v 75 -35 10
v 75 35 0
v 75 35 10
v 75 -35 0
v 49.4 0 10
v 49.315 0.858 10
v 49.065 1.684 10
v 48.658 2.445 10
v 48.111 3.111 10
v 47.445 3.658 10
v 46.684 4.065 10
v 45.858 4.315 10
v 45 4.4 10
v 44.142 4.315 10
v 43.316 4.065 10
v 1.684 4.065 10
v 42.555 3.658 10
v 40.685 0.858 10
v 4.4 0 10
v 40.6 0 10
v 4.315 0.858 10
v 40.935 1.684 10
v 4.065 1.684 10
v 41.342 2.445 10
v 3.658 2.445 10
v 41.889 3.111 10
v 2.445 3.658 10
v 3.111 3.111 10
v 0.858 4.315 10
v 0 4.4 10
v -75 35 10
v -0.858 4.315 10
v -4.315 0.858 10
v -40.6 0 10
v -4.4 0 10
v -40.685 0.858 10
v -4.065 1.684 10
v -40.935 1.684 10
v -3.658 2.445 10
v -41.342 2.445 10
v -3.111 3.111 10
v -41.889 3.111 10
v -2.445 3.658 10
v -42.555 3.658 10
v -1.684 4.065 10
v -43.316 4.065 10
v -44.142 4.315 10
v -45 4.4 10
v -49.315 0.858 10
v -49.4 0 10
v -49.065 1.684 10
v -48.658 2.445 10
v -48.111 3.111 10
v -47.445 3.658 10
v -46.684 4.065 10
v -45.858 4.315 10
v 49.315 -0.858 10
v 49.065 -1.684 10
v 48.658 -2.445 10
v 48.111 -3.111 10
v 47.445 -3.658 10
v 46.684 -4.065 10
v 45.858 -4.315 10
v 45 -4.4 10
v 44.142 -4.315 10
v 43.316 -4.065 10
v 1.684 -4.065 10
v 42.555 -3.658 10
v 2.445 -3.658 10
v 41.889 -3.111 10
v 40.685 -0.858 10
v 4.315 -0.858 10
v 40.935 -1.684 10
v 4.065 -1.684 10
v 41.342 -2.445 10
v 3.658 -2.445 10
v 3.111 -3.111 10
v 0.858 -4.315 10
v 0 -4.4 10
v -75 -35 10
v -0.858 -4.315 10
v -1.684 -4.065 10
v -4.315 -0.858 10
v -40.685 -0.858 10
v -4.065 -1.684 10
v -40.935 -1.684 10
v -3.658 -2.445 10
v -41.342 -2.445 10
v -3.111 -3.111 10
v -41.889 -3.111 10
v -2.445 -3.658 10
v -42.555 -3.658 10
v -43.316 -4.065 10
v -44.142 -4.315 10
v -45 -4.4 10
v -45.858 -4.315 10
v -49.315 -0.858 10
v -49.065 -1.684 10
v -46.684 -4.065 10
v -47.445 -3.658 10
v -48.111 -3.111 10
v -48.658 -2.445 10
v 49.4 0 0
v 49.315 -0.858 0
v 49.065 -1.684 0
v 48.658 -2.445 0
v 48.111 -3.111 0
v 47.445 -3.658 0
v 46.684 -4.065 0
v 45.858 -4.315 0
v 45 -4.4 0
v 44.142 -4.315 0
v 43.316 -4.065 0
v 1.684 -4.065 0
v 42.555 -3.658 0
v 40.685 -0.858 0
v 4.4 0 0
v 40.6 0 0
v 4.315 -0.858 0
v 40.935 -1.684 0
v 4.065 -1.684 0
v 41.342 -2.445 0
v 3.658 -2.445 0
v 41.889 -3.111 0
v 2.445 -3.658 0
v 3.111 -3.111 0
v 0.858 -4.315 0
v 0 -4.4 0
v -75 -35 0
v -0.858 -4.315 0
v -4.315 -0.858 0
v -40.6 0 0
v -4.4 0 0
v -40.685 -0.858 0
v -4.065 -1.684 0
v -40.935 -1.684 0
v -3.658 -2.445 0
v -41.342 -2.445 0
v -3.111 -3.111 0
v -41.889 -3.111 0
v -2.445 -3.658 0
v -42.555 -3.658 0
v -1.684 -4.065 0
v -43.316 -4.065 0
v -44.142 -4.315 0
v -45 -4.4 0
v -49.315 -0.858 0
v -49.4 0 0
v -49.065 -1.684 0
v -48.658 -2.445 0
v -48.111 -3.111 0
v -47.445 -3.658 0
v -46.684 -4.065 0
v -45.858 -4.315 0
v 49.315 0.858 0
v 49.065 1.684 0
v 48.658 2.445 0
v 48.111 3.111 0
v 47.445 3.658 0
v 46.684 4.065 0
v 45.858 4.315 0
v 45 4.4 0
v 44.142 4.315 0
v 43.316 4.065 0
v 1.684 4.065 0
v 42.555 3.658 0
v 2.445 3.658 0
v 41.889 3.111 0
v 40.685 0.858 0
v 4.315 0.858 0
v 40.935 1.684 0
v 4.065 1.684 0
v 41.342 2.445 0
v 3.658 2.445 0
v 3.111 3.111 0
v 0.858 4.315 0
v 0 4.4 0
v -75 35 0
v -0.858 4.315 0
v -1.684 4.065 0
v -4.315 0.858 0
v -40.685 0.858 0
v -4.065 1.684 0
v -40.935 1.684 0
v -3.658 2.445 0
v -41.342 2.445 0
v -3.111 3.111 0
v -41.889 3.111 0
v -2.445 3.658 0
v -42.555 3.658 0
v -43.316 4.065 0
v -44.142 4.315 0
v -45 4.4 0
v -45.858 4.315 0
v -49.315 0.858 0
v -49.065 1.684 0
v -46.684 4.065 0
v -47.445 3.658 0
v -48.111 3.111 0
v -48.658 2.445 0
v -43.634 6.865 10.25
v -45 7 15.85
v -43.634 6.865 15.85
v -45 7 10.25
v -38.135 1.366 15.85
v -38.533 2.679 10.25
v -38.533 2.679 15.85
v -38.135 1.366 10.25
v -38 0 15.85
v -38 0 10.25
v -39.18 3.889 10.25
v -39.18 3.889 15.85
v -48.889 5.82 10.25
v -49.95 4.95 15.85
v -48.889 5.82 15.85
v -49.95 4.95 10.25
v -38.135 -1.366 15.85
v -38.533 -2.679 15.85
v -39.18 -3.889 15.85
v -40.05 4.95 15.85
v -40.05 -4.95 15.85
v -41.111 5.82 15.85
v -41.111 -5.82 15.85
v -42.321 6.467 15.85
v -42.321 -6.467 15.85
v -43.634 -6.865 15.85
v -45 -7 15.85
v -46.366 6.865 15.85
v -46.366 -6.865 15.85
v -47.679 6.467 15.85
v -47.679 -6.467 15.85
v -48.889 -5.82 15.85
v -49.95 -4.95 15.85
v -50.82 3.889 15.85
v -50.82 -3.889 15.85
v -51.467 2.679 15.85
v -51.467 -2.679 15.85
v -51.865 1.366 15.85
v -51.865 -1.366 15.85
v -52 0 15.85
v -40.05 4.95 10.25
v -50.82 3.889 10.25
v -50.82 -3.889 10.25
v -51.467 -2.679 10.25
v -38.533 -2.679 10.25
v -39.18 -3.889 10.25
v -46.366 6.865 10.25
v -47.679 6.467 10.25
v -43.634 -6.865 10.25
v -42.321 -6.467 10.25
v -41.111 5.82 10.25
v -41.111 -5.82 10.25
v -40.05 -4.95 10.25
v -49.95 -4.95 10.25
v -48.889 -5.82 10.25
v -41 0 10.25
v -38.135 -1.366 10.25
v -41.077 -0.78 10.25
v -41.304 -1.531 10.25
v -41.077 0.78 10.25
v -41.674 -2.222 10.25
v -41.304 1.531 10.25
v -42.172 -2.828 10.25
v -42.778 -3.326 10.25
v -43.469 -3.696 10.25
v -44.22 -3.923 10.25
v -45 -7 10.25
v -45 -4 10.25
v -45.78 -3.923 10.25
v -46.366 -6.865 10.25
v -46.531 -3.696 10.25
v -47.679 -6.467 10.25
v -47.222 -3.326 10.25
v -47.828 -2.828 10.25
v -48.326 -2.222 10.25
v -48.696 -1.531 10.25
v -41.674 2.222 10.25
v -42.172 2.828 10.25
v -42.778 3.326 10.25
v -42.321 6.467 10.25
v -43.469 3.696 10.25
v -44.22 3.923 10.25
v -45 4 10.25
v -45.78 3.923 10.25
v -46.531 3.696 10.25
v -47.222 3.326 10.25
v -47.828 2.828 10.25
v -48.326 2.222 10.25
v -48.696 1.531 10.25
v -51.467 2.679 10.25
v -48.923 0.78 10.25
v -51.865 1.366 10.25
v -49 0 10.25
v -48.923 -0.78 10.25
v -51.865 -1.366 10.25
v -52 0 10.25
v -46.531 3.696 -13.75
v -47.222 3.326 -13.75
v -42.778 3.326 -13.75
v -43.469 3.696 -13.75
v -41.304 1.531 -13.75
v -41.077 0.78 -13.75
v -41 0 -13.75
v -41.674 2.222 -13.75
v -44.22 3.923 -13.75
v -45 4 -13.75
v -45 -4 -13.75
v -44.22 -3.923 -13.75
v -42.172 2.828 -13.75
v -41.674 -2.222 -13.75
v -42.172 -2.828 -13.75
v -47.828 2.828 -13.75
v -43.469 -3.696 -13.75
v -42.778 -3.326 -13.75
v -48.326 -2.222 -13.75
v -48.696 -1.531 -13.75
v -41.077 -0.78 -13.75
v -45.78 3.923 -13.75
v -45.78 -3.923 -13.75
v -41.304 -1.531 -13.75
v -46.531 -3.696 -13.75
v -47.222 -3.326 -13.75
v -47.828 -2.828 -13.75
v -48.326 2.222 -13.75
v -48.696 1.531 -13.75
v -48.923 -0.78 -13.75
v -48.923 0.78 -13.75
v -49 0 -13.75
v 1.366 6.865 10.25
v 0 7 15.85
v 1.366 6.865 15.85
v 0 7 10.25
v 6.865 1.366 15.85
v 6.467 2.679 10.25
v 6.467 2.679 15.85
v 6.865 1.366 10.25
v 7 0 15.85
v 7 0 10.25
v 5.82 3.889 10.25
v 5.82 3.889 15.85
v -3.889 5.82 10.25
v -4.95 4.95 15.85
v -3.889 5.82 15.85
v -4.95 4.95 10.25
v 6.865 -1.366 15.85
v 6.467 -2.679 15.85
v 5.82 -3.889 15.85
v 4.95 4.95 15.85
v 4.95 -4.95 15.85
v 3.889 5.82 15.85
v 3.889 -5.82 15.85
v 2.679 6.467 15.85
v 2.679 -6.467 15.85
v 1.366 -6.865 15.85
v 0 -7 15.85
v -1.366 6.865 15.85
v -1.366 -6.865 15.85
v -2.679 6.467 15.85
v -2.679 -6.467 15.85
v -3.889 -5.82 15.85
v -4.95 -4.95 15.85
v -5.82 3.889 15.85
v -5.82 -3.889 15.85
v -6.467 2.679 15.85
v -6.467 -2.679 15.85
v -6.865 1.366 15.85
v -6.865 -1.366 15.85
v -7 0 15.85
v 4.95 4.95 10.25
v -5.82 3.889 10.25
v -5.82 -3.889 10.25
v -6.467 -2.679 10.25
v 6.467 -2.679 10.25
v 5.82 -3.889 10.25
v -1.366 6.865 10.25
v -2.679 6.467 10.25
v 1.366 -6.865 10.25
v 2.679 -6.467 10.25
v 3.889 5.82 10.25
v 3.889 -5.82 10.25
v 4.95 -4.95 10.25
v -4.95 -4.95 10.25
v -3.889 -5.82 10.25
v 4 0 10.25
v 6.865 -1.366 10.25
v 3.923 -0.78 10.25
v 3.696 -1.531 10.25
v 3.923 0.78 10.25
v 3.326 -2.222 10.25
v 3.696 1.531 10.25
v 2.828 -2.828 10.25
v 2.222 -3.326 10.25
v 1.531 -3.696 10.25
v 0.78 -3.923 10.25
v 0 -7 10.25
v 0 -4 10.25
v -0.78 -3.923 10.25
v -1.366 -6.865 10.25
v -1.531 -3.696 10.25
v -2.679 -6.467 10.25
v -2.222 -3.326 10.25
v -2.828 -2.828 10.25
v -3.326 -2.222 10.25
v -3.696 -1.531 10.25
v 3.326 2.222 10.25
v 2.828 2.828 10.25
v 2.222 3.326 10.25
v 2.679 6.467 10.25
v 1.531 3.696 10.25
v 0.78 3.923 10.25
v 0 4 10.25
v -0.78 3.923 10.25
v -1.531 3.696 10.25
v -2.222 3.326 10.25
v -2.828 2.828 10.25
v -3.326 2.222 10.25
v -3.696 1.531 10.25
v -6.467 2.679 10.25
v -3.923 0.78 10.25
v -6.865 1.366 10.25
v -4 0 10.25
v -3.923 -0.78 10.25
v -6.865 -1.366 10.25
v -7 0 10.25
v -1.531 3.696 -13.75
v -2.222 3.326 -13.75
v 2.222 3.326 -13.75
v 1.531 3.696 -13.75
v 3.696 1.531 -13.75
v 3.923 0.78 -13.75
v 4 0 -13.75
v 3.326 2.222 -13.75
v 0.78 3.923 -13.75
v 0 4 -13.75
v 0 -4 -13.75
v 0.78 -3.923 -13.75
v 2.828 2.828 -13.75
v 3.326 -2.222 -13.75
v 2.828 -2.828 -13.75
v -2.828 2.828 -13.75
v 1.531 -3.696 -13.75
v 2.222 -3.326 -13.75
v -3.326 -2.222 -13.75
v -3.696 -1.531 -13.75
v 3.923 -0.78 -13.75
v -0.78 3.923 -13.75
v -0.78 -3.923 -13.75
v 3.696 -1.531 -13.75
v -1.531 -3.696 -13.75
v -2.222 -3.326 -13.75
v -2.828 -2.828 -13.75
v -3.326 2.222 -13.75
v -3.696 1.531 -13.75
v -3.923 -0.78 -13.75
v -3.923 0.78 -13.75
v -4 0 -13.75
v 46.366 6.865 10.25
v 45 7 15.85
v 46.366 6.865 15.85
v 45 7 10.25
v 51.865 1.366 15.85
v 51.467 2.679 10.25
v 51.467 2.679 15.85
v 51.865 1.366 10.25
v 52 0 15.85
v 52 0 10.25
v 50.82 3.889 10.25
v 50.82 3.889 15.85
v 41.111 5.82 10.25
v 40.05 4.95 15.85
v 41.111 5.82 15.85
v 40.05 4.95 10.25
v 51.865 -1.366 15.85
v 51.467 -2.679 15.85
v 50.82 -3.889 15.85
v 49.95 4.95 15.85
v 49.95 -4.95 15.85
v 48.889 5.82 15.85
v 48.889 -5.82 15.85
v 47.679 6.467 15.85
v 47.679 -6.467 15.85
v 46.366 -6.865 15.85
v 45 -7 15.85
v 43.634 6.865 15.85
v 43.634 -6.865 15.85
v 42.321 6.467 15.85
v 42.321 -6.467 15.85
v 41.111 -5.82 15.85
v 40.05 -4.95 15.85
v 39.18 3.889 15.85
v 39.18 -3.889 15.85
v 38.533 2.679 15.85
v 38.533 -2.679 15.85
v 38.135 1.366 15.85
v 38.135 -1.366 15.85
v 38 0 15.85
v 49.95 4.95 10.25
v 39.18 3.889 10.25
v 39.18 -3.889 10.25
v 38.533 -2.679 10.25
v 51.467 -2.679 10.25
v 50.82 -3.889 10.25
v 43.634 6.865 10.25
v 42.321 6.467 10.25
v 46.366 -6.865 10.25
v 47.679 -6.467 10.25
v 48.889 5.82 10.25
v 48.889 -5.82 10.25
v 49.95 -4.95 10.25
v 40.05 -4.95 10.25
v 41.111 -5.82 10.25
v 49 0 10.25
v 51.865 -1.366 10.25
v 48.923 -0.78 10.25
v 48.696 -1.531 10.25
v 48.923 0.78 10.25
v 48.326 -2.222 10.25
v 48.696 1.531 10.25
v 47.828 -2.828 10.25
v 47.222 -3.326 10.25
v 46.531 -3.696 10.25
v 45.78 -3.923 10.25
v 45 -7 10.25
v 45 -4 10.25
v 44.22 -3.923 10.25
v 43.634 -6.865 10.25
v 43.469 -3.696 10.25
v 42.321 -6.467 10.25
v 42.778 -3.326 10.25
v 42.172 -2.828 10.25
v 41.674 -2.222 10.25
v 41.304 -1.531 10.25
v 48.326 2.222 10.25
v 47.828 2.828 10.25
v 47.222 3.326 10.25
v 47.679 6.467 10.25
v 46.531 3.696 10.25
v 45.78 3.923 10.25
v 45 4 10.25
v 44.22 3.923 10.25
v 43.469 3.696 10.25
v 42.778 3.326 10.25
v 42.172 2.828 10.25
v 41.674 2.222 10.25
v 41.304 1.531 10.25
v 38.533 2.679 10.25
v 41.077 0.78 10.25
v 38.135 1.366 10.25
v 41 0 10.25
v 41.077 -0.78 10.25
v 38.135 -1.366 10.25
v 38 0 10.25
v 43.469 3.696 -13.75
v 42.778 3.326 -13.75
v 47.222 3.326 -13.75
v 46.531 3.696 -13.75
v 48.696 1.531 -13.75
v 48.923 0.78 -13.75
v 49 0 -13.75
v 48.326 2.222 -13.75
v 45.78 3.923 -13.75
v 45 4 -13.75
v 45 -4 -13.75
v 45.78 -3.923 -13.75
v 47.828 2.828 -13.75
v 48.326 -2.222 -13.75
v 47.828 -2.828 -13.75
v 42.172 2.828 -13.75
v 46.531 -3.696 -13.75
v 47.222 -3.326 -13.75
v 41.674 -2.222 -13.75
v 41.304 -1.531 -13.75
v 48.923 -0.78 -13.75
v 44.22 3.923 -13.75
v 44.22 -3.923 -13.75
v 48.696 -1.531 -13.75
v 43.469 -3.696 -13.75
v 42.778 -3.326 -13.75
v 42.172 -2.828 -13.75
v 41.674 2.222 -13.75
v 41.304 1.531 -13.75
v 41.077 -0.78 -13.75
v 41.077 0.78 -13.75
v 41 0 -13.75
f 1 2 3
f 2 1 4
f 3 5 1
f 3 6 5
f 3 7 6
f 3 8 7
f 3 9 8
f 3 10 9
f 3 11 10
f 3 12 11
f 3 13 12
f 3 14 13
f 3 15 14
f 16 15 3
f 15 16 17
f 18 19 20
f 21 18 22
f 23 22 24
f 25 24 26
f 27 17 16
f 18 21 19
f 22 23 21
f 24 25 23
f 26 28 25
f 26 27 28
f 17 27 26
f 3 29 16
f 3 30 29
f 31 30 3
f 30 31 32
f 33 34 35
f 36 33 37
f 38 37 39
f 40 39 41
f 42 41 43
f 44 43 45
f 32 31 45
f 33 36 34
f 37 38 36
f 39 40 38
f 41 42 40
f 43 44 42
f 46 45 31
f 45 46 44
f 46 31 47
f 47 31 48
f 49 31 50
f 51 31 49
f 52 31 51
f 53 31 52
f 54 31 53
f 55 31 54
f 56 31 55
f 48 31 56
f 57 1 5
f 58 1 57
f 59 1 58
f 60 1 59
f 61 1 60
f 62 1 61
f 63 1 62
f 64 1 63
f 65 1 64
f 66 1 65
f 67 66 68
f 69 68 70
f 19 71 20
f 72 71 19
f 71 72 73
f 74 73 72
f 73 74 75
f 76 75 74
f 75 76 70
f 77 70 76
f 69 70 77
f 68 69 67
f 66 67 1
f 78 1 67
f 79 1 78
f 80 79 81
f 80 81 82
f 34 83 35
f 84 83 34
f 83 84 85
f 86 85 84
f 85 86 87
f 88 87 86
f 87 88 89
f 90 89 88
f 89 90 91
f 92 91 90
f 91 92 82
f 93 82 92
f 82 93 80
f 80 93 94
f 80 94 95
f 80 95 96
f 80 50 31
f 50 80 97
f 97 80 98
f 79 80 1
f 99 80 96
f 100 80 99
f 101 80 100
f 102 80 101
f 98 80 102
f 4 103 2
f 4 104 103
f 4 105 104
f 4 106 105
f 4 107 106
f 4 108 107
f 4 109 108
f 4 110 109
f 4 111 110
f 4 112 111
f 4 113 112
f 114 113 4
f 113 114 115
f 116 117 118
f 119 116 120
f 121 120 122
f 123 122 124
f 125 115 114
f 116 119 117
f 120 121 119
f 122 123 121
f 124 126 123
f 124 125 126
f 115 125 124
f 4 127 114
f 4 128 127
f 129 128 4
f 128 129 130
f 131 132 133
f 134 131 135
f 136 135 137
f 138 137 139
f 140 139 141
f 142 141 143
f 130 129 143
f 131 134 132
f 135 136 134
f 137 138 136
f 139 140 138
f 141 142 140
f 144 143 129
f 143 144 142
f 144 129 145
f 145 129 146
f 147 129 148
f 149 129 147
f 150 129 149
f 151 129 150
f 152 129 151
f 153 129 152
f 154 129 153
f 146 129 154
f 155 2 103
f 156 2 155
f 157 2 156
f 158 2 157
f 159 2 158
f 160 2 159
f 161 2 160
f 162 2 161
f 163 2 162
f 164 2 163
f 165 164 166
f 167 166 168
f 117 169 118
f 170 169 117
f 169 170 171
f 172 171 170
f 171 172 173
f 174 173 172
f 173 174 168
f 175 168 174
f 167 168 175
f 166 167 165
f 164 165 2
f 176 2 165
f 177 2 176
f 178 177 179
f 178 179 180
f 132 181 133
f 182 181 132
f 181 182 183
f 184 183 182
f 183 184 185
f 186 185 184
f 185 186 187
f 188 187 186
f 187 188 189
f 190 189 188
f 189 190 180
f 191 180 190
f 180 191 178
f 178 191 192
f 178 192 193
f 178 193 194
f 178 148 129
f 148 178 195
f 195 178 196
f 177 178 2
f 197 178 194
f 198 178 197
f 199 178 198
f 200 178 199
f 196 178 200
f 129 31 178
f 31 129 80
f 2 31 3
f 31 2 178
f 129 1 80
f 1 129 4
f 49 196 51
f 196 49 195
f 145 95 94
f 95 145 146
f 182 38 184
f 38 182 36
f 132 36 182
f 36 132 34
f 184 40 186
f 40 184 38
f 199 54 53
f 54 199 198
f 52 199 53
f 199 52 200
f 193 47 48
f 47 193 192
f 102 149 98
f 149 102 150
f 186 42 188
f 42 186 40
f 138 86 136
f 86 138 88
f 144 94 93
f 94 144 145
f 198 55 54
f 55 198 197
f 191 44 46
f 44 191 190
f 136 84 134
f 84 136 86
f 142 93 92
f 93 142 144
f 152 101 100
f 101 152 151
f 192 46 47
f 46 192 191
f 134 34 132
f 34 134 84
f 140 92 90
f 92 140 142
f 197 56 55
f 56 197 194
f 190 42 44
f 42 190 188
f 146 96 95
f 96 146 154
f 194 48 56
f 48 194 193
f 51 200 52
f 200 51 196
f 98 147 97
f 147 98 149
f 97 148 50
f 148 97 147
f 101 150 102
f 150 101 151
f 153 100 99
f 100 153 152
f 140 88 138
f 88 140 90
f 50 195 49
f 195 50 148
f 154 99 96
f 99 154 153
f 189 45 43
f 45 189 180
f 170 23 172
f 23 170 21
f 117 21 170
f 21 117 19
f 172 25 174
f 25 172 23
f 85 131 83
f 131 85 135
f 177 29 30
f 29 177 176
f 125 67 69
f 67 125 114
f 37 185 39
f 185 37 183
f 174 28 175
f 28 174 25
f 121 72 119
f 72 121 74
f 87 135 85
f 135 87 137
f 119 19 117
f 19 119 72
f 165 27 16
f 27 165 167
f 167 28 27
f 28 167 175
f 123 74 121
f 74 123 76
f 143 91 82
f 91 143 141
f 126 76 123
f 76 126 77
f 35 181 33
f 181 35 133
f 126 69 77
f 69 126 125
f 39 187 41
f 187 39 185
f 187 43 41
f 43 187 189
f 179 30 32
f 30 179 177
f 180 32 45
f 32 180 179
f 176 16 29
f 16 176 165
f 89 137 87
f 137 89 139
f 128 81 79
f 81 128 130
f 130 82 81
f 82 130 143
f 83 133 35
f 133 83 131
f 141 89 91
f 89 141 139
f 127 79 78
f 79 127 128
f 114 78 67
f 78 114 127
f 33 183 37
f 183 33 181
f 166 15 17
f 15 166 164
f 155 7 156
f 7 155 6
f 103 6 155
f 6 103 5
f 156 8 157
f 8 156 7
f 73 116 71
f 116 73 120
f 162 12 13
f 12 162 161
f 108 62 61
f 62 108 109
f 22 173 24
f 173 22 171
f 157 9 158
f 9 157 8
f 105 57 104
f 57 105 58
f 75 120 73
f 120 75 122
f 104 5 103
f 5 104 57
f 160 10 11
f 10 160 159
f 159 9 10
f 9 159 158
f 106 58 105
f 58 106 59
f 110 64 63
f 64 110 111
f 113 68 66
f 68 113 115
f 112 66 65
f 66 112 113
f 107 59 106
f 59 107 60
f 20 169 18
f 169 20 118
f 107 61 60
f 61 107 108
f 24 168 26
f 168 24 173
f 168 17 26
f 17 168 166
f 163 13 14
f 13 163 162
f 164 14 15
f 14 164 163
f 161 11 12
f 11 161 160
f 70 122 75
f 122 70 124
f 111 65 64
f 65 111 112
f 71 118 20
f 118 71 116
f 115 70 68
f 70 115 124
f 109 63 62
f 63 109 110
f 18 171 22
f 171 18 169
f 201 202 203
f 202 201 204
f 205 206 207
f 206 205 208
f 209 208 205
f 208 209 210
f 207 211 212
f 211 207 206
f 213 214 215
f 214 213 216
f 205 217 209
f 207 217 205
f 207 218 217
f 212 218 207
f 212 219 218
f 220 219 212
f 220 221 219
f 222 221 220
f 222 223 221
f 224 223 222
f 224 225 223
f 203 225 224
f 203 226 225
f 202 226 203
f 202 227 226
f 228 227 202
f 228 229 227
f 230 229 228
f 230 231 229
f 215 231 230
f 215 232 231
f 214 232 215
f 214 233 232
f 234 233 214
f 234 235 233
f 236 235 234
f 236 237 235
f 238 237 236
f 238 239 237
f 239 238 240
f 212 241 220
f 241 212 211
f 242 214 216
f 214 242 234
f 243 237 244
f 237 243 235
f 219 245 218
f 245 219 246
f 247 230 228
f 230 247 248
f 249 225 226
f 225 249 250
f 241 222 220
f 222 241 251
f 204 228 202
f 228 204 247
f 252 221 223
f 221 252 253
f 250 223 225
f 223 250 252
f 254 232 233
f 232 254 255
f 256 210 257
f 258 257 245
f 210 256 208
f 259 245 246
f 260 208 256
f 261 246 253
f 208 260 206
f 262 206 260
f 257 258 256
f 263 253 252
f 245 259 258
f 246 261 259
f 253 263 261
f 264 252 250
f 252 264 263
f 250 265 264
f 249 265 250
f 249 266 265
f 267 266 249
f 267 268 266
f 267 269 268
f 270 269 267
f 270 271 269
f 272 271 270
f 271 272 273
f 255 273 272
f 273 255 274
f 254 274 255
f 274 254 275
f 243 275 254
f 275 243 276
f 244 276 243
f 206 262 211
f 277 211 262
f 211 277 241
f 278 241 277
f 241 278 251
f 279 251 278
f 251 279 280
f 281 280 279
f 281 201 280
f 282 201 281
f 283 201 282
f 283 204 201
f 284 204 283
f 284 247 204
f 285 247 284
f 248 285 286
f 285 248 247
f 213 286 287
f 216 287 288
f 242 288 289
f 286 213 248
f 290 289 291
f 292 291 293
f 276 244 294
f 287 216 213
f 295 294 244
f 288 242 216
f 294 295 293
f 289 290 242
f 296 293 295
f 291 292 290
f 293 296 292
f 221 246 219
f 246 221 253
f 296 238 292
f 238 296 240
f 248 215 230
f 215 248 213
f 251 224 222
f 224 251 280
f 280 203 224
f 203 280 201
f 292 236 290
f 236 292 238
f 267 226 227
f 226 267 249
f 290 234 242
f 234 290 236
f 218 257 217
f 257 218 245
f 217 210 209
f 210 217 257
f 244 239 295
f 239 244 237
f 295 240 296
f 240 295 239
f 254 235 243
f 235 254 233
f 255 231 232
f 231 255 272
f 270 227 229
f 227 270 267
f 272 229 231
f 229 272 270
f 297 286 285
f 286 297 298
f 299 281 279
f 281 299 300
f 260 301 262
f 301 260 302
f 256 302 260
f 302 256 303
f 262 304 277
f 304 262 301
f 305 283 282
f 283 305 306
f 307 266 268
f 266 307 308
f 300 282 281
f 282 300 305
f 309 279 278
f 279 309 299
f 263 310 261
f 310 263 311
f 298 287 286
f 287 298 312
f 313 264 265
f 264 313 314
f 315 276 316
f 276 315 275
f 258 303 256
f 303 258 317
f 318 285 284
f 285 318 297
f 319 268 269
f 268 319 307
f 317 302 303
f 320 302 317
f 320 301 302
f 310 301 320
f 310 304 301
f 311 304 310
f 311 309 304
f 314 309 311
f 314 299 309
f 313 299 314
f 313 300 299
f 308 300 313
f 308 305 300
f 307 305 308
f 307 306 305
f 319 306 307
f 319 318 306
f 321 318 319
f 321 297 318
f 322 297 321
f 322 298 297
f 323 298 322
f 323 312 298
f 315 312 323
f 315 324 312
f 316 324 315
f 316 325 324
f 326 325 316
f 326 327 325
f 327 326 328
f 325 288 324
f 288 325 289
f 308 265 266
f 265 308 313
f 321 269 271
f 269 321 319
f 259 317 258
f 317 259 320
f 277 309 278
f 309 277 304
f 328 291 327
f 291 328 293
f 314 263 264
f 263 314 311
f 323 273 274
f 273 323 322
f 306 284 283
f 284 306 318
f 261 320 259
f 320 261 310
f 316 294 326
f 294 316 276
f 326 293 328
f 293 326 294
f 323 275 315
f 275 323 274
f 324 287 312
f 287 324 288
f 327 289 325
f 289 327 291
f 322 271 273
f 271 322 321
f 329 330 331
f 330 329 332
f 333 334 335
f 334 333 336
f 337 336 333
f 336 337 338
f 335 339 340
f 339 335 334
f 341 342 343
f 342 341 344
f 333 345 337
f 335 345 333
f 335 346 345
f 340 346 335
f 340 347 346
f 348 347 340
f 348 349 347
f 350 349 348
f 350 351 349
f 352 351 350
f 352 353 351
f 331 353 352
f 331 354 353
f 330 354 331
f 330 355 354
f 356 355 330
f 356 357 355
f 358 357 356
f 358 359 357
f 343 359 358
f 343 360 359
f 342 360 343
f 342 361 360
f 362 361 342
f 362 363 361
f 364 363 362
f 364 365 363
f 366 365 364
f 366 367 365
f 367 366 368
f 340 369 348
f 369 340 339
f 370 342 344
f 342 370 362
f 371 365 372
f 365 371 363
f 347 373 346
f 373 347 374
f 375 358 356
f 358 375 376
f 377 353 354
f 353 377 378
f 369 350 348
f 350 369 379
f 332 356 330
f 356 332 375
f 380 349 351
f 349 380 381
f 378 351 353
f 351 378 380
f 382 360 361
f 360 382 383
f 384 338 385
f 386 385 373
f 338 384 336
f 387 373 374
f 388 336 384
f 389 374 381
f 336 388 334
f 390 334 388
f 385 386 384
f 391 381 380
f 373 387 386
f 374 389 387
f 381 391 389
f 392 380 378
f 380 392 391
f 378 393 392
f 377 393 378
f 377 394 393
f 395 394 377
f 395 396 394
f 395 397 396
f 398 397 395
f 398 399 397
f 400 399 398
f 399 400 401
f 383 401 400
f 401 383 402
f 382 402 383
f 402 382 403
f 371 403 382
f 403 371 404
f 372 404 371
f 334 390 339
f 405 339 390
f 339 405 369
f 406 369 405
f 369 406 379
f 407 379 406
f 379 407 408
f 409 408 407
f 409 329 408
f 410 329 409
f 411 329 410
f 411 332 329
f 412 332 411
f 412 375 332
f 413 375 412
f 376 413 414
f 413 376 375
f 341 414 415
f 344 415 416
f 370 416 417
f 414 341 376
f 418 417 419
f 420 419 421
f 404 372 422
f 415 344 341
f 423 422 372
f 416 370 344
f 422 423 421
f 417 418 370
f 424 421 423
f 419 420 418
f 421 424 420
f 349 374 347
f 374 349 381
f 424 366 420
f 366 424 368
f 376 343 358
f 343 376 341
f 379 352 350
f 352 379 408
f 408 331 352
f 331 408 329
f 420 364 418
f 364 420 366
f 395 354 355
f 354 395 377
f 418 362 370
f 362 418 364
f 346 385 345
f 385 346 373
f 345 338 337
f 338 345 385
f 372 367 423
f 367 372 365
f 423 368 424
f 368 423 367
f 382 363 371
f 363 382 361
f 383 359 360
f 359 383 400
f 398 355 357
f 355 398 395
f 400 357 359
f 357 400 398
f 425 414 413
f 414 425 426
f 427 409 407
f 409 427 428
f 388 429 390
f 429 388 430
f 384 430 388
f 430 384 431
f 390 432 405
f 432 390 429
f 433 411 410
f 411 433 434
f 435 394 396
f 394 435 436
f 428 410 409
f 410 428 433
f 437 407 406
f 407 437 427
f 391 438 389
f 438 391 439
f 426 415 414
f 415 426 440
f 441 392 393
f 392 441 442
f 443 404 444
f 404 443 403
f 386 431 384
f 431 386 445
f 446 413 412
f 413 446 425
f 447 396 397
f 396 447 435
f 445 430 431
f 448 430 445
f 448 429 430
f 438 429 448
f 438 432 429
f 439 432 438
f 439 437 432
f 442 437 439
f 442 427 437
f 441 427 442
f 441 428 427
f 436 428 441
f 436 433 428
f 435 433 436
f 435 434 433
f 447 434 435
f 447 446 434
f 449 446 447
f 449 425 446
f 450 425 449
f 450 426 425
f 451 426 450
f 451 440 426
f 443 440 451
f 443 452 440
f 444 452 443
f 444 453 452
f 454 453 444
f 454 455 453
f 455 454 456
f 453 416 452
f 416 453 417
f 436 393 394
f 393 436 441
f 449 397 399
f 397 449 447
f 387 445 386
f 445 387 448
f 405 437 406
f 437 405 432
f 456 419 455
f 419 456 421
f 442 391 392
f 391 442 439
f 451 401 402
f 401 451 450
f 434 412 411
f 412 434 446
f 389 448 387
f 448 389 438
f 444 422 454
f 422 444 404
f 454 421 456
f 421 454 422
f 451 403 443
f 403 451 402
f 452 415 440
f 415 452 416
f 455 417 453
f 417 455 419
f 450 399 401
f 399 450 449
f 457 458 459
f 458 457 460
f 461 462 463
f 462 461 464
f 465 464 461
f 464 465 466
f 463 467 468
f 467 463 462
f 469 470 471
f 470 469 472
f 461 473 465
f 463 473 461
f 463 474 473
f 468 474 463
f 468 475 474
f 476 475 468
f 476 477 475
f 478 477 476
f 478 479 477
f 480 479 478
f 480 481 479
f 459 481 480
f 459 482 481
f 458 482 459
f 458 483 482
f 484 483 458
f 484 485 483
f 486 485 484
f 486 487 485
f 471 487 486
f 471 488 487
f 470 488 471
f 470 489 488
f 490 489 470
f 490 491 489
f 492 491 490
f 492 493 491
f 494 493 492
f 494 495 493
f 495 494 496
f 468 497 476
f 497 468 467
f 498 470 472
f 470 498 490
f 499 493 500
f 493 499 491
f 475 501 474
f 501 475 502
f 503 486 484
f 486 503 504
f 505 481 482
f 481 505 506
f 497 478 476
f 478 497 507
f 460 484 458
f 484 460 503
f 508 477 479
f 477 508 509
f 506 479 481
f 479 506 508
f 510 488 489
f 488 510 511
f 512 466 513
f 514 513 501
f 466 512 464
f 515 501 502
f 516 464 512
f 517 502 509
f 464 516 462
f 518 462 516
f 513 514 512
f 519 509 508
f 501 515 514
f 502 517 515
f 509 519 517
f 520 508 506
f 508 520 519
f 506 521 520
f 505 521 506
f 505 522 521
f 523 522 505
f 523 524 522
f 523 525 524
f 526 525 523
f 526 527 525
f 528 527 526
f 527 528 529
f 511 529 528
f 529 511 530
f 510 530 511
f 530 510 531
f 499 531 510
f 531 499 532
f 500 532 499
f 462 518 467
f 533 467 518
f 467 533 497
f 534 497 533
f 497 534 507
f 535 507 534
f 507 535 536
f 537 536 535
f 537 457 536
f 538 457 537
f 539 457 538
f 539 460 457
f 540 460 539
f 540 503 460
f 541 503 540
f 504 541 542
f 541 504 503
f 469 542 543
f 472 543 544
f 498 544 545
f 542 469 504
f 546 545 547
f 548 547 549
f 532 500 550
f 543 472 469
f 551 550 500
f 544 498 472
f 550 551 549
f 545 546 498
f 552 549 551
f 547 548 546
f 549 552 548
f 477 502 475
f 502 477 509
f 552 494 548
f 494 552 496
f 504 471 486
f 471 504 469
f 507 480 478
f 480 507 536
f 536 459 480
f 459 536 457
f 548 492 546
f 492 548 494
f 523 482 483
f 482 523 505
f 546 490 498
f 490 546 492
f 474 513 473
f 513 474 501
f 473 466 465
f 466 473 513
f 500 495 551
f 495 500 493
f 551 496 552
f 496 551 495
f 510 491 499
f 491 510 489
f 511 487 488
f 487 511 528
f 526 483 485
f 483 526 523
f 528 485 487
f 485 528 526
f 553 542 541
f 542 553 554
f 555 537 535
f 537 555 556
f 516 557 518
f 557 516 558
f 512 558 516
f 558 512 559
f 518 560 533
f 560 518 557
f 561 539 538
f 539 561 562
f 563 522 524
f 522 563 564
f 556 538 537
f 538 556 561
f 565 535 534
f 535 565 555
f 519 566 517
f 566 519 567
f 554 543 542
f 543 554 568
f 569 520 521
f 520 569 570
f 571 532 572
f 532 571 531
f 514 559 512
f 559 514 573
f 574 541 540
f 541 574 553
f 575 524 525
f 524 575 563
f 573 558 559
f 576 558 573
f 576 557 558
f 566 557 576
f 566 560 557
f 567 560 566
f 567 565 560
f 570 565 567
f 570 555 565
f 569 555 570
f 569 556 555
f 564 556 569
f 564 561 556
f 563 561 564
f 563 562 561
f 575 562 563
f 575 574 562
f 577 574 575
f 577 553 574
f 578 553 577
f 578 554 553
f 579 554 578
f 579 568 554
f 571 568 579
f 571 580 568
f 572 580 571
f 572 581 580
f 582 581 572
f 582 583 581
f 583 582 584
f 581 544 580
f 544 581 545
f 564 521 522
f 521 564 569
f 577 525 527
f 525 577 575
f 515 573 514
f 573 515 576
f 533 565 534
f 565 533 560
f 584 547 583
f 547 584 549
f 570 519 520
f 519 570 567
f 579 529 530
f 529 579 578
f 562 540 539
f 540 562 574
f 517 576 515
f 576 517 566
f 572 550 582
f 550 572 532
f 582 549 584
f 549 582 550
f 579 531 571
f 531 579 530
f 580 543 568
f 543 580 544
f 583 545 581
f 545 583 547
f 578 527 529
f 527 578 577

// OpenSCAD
$fn = 32;

// ------------------------------------------------------------------------
// Bolted plate: 150 x 70 x 10 mm plate, 3 fasteners
// Every part is its own module, assembly() places them once.
// ------------------------------------------------------------------------

// --- part 1 ---
module plate() {
  difference() {
    translate([-75, -35, 0]) cube([150, 70, 10]);
    translate([-45, 0, -1]) cylinder(h = 12, d = 8.8);
    translate([0, 0, -1]) cylinder(h = 12, d = 8.8);
    translate([45, 0, -1]) cylinder(h = 12, d = 8.8);
  }
}

// --- part 2 ---
module bolt1() {
  cylinder(h = 5.6, d = 14);
  translate([0, 0, -24]) cylinder(h = 24, d = 8);
}

// --- part 3 ---
module bolt2() {
  cylinder(h = 5.6, d = 14);
  translate([0, 0, -24]) cylinder(h = 24, d = 8);
}

// --- part 4 ---
module bolt3() {
  cylinder(h = 5.6, d = 14);
  translate([0, 0, -24]) cylinder(h = 24, d = 8);
}

// --- assembly ---
module assembly() {
  translate([0, 0, 0]) rotate([0, 0, 0]) plate();
  translate([-45, 0, 10.25]) rotate([0, 0, 0]) bolt1();
  translate([0, 0, 10.25]) rotate([0, 0, 0]) bolt2();
  translate([45, 0, 10.25]) rotate([0, 0, 0]) bolt3();
}

assembly();
